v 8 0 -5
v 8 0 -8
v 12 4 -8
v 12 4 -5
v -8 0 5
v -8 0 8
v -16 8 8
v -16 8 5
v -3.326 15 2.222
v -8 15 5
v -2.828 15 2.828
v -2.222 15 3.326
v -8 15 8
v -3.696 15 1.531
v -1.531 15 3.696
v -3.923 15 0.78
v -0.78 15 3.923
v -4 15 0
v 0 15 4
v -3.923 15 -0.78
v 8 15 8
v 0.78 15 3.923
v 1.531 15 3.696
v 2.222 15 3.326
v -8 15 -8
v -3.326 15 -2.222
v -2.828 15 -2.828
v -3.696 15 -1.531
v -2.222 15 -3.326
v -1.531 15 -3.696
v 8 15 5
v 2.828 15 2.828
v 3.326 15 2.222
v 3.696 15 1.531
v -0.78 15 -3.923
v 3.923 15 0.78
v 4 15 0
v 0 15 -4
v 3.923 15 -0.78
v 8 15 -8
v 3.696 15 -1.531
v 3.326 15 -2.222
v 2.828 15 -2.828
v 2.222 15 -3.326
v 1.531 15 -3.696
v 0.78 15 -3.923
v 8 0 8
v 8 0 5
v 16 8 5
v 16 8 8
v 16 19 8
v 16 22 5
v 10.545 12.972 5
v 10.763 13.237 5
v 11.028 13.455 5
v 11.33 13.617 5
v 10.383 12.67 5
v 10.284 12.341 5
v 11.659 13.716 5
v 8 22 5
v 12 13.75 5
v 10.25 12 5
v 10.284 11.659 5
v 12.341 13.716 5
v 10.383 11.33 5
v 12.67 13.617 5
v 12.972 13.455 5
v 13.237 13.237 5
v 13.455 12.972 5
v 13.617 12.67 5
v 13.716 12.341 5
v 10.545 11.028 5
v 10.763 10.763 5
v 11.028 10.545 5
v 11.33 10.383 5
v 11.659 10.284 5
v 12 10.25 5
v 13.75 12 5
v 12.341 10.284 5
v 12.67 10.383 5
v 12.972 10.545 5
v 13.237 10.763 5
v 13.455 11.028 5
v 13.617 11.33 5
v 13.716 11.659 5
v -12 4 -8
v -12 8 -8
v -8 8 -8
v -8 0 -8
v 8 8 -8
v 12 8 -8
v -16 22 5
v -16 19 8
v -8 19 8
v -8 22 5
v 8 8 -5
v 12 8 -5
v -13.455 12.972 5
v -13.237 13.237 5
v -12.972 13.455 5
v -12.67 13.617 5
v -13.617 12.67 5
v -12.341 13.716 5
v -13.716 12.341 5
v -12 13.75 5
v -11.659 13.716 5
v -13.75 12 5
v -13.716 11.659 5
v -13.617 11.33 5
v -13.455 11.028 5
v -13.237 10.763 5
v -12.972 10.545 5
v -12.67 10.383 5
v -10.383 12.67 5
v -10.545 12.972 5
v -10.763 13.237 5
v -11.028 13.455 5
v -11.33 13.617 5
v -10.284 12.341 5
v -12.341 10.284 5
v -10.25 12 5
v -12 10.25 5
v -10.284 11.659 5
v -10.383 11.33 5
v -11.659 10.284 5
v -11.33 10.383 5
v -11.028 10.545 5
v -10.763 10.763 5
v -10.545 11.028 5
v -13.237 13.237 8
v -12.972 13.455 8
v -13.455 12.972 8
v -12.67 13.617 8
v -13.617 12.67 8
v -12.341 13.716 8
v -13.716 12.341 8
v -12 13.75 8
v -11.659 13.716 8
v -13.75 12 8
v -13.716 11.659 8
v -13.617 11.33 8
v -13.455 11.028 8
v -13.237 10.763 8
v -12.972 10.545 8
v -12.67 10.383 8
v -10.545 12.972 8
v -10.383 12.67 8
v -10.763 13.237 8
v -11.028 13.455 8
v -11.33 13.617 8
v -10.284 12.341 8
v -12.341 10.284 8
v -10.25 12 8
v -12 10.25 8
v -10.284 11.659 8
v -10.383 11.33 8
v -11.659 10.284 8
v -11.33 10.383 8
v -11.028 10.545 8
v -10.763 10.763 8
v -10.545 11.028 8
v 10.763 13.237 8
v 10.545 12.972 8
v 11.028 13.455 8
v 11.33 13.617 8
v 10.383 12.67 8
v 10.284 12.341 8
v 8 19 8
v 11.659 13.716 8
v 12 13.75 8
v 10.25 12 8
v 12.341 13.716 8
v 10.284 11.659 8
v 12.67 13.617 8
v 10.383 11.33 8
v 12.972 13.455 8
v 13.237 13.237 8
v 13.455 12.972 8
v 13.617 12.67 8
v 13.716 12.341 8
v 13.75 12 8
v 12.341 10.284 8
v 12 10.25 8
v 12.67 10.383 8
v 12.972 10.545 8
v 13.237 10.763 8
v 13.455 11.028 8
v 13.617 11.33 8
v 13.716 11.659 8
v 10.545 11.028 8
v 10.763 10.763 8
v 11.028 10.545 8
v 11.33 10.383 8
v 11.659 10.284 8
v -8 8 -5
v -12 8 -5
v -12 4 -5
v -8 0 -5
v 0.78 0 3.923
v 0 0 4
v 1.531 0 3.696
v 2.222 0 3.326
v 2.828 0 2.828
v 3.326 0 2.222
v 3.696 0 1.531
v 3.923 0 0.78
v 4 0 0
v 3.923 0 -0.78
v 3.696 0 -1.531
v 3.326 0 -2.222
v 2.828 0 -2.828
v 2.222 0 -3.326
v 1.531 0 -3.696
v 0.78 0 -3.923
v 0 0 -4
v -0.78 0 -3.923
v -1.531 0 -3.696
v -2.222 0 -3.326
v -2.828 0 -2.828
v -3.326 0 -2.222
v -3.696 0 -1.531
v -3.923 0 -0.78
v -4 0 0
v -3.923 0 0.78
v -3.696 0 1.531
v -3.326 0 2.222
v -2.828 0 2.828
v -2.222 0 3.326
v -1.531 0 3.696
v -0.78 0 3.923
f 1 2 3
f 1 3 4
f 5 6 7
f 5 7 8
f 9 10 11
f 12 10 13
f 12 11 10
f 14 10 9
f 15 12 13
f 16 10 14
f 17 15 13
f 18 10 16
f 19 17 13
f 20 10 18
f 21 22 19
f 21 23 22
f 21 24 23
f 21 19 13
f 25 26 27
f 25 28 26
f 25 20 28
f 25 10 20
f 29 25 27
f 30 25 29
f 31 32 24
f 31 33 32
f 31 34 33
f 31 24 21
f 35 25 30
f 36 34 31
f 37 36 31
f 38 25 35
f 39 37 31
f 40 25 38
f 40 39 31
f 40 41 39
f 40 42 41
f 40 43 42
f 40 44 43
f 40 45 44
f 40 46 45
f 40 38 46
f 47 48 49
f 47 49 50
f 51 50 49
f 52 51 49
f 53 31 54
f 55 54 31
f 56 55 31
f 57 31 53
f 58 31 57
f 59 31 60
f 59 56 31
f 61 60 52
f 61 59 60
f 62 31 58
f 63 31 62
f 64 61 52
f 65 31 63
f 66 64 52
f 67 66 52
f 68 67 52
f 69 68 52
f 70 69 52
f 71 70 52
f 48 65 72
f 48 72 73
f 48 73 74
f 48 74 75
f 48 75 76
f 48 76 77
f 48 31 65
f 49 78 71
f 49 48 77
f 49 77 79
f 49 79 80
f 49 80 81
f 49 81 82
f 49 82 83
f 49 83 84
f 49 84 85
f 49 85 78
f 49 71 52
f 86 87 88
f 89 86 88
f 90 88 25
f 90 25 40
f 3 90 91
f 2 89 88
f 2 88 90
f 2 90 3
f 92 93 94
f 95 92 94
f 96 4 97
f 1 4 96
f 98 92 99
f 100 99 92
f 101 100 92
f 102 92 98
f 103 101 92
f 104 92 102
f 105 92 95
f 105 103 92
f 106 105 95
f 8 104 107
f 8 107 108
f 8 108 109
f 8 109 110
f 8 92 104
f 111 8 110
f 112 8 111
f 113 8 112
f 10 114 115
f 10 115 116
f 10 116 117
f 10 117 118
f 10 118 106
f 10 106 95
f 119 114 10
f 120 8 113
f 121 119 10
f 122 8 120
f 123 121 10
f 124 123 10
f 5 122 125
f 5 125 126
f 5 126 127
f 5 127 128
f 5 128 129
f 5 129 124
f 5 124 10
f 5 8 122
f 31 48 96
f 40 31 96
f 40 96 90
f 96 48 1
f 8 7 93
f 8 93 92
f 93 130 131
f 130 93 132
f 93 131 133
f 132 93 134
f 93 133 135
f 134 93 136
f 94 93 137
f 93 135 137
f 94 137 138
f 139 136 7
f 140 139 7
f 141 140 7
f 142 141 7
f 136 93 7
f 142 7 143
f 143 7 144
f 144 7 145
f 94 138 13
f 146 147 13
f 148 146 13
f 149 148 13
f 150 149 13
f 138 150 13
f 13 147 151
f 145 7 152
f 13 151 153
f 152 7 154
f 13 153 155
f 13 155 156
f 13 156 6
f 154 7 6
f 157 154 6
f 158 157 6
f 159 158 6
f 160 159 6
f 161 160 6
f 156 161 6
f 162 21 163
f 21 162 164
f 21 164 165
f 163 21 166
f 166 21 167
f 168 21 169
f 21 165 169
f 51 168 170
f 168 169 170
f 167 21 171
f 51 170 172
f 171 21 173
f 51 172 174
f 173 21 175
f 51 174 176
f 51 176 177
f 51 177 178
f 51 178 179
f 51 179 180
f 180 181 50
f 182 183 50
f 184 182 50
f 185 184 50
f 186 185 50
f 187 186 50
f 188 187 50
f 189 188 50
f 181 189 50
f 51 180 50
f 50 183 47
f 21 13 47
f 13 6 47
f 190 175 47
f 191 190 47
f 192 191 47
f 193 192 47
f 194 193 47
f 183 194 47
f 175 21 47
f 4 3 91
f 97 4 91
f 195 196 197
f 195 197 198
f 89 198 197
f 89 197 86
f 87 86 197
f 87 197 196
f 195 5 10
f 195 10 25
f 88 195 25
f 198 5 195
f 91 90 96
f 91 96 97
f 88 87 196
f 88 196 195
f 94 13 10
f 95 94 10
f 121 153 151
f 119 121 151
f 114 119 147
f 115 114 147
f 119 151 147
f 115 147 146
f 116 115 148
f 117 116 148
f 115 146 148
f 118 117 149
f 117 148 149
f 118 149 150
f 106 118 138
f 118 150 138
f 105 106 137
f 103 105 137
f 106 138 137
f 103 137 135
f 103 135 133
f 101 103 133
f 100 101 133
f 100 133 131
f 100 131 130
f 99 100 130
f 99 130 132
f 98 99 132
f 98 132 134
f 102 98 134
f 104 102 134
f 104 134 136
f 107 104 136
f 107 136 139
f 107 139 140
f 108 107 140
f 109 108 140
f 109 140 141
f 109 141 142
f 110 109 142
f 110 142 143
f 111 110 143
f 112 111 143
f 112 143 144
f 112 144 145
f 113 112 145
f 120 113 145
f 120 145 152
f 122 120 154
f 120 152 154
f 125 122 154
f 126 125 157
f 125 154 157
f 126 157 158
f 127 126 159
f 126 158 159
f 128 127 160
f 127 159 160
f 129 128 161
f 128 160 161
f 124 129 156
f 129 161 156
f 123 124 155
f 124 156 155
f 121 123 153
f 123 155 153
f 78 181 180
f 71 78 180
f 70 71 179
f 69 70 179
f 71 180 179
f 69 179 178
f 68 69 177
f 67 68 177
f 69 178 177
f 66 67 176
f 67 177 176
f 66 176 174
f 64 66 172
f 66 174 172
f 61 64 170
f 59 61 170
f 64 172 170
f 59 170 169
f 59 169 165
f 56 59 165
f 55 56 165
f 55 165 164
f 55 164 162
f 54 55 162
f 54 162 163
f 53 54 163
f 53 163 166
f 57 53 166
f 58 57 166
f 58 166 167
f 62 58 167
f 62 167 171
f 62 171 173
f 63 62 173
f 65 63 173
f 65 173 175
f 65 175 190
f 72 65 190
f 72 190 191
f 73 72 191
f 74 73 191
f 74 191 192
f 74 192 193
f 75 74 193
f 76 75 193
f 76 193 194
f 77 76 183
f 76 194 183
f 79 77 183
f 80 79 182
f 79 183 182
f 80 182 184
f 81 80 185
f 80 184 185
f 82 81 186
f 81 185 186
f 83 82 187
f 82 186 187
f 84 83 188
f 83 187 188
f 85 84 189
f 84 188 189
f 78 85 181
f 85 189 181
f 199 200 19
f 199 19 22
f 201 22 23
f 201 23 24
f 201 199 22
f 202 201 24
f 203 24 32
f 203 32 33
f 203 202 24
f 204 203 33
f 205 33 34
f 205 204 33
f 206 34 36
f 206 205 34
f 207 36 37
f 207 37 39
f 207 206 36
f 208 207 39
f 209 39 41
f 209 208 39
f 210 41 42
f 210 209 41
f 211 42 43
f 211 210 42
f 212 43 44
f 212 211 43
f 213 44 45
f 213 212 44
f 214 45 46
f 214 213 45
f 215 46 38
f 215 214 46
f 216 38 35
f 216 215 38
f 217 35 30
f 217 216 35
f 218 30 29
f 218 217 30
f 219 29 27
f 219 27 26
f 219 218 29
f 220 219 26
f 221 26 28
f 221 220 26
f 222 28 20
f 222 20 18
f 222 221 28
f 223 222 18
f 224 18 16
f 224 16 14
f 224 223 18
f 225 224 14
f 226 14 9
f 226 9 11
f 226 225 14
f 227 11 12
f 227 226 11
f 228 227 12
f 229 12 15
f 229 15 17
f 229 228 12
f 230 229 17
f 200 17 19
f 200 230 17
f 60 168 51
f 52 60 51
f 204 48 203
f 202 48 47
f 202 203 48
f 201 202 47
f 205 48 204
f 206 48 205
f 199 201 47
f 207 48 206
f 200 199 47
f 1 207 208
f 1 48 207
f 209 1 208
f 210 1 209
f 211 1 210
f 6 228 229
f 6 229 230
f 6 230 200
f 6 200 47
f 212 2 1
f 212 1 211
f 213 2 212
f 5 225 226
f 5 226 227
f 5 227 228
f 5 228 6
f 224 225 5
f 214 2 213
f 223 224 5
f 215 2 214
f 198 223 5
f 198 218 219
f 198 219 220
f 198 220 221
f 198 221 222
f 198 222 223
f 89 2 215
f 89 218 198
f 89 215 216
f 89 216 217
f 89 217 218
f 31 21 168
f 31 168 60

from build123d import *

# Parameters (mm, degrees)
SKETCH1_R                      = 4
BOSS_EXTRUDE1_DEPTH            = 15
CHAMFER1_SIZE                  = 8
SKETCH2_W                      = 8
SKETCH2_H                      = 3
BOSS_EXTRUDE2_DEPTH            = 7
CHAMFER3_SIZE                  = 3
SKETCH4_W                      = 32
SKETCH4_H                      = 3
CUT_EXTRUDE2_DEPTH             = 7
CUT_EXTRUDE2_DIRECTION_2_REACH = 25.345
CUT_EXTRUDE3_REACH             = 33.559
SKETCH6_R                      = 1.75
CUT_EXTRUDE4_DEPTH             = 32.559467676
SKETCH7_W                      = 16
SKETCH7_H                      = 3
BOSS_EXTRUDE3_DEPTH            = 7


with BuildPart() as part:
    # Sketch1 → Boss-Extrude1 (new body)
    with BuildSketch(Plane(origin=(0, 0, 0), x_dir=(1, 0, 0), z_dir=(0, 1, 0))):
        Polygon((-8, -5), (-8, 5), (-16, 5), (-16, 8), (16, 8), (16, 5), (8, 5), (8, -5), (16, -5), (16, -8), (-16, -8), (-16, -5), align=None)
        with Locations(Location((0, 0, 0), (0, 0, 270))):
            Circle(SKETCH1_R, mode=Mode.SUBTRACT)
    extrude(amount=BOSS_EXTRUDE1_DEPTH)

    # Chamfer1
    chamfer1_edges = [part.edges().sort_by_distance(p)[0] for p in [
        (16, 0, 6.5),
        (-16, 0, 6.5),
        (-16, 0, -6.5),
        (16, 0, -6.5),
    ]]
    chamfer(chamfer1_edges, length=CHAMFER1_SIZE)

    # Sketch2 → Boss-Extrude2 (add)
    with BuildSketch(Plane(origin=(0, 15, 0), x_dir=(1, 0, 0), z_dir=(0, 1, 0))):
        with Locations((12, -6.5)):
            Rectangle(SKETCH2_W, SKETCH2_H)
        with Locations((12, 6.5)):
            Rectangle(SKETCH2_W, SKETCH2_H)
        with Locations((-12, -6.5)):
            Rectangle(SKETCH2_W, SKETCH2_H)
        with Locations((-12, 6.5)):
            Rectangle(SKETCH2_W, SKETCH2_H)
    extrude(amount=BOSS_EXTRUDE2_DEPTH)

    # Chamfer3
    chamfer3_edges = [part.edges().sort_by_distance(p)[0] for p in [
        (-12, 22, 8),
        (12, 22, 8),
        (-12, 22, -8),
        (12, 22, -8),
    ]]
    chamfer(chamfer3_edges, length=CHAMFER3_SIZE - 0.0001)  # a hair under: the kernel refuses the full size

    # Sketch4 → Cut-Extrude2 (cut)
    with BuildSketch(Plane(origin=(0, 15, 0), x_dir=(1, 0, 0), z_dir=(0, 1, 0))):
        with Locations((0, 6.5)):
            Rectangle(SKETCH4_W, SKETCH4_H)
    extrude(amount=-CUT_EXTRUDE2_DEPTH, mode=Mode.SUBTRACT)

    # Sketch4 → Cut-Extrude2 direction 2 (cut, up to next)
    with BuildSketch(Plane(origin=(0, 15, 0), x_dir=(1, 0, 0), z_dir=(0, 1, 0)), mode=Mode.PRIVATE) as cut_extrude2_direction_2_sk1:
        with Locations((0, 6.5)):
            Rectangle(SKETCH4_W, SKETCH4_H)
    cut_extrude2_direction_2_tool1 = extrude(cut_extrude2_direction_2_sk1.sketch, amount=CUT_EXTRUDE2_DIRECTION_2_REACH, mode=Mode.PRIVATE) & part.part
    add(cut_extrude2_direction_2_tool1.solids().sort_by_distance((0, 15, -6.5))[0], mode=Mode.SUBTRACT)


with BuildPart() as cut_extrude2_kept_piece:
    # of the separate pieces the step leaves, the one the design keeps (cut_extrude2_pieces_kept)
    add(part.part.solids().sort_by_distance((-16, 8, -5))[0])

    # Sketch5 → Cut-Extrude3 (cut, up to next)
    with BuildSketch(Plane(origin=(0, 0, -8), x_dir=(-1, 0, 0), z_dir=(0, 0, -1)), mode=Mode.PRIVATE) as cut_extrude3_sk1:
        Polygon((-12, 4), (-12, 8), (-16, 8), align=None)
    cut_extrude3_tool1 = extrude(cut_extrude3_sk1.sketch, amount=-CUT_EXTRUDE3_REACH, mode=Mode.PRIVATE) & cut_extrude2_kept_piece.part
    # Sketch5 → Cut-Extrude3 (cut, up to next)
    with BuildSketch(Plane(origin=(0, 0, -8), x_dir=(-1, 0, 0), z_dir=(0, 0, -1)), mode=Mode.PRIVATE) as cut_extrude3_sk2:
        Polygon((16, 8), (12, 4), (12, 8), align=None)
    cut_extrude3_tool2 = extrude(cut_extrude3_sk2.sketch, amount=-CUT_EXTRUDE3_REACH, mode=Mode.PRIVATE) & cut_extrude2_kept_piece.part
    add(cut_extrude3_tool1.solids().sort_by_distance((13.333333, 6.666667, -8))[0], mode=Mode.SUBTRACT)
    add(cut_extrude3_tool2.solids().sort_by_distance((-13.333333, 6.666667, -8))[0], mode=Mode.SUBTRACT)

    # Sketch6 → Cut-Extrude4 (cut, through all)
    with BuildSketch(Plane.XY.offset(8)):
        with Locations((12, 12)):
            Circle(SKETCH6_R)
        with Locations((-12, 12)):
            Circle(SKETCH6_R)
    extrude(amount=-CUT_EXTRUDE4_DEPTH, mode=Mode.SUBTRACT)

    # Sketch7 → Boss-Extrude3 (add)
    with BuildSketch(Plane(origin=(0, 8, 0), x_dir=(1, 0, 0), z_dir=(0, 1, 0))):
        with Locations((0, 6.5)):
            Rectangle(SKETCH7_W, SKETCH7_H)
    extrude(amount=BOSS_EXTRUDE3_DEPTH)


solid = cut_extrude2_kept_piece.part
